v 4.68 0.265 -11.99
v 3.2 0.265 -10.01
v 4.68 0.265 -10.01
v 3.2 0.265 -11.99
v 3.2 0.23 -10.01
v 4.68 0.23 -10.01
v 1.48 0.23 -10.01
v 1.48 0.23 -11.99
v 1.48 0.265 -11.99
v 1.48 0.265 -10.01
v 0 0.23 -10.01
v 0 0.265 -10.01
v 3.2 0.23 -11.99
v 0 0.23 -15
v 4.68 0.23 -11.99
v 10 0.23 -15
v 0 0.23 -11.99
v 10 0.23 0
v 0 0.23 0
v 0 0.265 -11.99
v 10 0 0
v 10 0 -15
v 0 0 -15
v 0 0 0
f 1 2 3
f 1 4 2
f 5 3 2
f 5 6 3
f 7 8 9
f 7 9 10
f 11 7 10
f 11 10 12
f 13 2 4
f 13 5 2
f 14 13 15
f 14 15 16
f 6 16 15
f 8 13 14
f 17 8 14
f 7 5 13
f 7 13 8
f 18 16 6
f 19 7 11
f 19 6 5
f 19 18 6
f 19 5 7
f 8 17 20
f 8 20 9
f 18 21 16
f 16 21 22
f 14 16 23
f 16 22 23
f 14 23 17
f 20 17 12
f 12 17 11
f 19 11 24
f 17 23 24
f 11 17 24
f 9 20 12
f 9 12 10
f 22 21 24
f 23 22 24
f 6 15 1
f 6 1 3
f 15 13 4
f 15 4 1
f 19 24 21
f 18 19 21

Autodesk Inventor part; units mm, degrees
ref_plane "YZ Plane" through (0, 0, 0) normal (1, 0, 0) x (0, 1, 0)
ref_plane "XZ Plane" through (0, 0, 0) normal (0, 1, 0) x (-1, 0, 0)
ref_plane "XY Plane" through (0, 0, 0) normal (0, 0, 1) x (1, 0, 0)
sketch "Sketch1" plane through (0, 0, 0) normal (0, 1, 0) x (-1, 0, 0)
  line L0 (0, 0) -> (-10, 0)
  line L1 (-10, 0) -> (-10, -15)
  line L2 (-10, -15) -> (0, -15)
  line L3 (0, -15) -> (0, 0)
  dimension "d0" = 15
  dimension "d1" = 10
extrude "Extrusion1" add sketch "Sketch1" along normal blind 0.23
sketch "Sketch2" plane through (0, 0.23, 0) normal (0, 1, 0) x (1, 0, 0)
  line L0 (4.68, 10.01) -> (3.2, 10.01)
  line L1 (3.2, 10.01) -> (3.2, 11.99)
  line L2 (3.2, 11.99) -> (4.68, 11.99)
  line L3 (4.68, 11.99) -> (4.68, 10.01)
  line L4 (1.48, 10.01) -> (0, 10.01)
  line L5 (0, 10.01) -> (0, 11.99)
  line L6 (0, 11.99) -> (1.48, 11.99)
  line L7 (1.48, 11.99) -> (1.48, 10.01)
  line L8 (0, 11.99) -> (1.48, 10.01) construction
  line L9 (3.2, 11.99) -> (4.68, 10.01) construction
  line L10 (10, 15) -> (0, 15) construction
  line L11 (10, 0) -> (10, 15) construction
  line L12 (0, 15) -> (0, 0) projected
  point P0 (0.74, 11)
  point P1 (3.94, 11)
  dimension "d4" = 3.2
  dimension "d5" = 4
  dimension "d6" = 1.48
  dimension "d7" = 1.98
extrude "Extrusion2" add sketch "Sketch2" along normal blind 0.035
properties part number "Antenna" material "Copper, Wrought"
